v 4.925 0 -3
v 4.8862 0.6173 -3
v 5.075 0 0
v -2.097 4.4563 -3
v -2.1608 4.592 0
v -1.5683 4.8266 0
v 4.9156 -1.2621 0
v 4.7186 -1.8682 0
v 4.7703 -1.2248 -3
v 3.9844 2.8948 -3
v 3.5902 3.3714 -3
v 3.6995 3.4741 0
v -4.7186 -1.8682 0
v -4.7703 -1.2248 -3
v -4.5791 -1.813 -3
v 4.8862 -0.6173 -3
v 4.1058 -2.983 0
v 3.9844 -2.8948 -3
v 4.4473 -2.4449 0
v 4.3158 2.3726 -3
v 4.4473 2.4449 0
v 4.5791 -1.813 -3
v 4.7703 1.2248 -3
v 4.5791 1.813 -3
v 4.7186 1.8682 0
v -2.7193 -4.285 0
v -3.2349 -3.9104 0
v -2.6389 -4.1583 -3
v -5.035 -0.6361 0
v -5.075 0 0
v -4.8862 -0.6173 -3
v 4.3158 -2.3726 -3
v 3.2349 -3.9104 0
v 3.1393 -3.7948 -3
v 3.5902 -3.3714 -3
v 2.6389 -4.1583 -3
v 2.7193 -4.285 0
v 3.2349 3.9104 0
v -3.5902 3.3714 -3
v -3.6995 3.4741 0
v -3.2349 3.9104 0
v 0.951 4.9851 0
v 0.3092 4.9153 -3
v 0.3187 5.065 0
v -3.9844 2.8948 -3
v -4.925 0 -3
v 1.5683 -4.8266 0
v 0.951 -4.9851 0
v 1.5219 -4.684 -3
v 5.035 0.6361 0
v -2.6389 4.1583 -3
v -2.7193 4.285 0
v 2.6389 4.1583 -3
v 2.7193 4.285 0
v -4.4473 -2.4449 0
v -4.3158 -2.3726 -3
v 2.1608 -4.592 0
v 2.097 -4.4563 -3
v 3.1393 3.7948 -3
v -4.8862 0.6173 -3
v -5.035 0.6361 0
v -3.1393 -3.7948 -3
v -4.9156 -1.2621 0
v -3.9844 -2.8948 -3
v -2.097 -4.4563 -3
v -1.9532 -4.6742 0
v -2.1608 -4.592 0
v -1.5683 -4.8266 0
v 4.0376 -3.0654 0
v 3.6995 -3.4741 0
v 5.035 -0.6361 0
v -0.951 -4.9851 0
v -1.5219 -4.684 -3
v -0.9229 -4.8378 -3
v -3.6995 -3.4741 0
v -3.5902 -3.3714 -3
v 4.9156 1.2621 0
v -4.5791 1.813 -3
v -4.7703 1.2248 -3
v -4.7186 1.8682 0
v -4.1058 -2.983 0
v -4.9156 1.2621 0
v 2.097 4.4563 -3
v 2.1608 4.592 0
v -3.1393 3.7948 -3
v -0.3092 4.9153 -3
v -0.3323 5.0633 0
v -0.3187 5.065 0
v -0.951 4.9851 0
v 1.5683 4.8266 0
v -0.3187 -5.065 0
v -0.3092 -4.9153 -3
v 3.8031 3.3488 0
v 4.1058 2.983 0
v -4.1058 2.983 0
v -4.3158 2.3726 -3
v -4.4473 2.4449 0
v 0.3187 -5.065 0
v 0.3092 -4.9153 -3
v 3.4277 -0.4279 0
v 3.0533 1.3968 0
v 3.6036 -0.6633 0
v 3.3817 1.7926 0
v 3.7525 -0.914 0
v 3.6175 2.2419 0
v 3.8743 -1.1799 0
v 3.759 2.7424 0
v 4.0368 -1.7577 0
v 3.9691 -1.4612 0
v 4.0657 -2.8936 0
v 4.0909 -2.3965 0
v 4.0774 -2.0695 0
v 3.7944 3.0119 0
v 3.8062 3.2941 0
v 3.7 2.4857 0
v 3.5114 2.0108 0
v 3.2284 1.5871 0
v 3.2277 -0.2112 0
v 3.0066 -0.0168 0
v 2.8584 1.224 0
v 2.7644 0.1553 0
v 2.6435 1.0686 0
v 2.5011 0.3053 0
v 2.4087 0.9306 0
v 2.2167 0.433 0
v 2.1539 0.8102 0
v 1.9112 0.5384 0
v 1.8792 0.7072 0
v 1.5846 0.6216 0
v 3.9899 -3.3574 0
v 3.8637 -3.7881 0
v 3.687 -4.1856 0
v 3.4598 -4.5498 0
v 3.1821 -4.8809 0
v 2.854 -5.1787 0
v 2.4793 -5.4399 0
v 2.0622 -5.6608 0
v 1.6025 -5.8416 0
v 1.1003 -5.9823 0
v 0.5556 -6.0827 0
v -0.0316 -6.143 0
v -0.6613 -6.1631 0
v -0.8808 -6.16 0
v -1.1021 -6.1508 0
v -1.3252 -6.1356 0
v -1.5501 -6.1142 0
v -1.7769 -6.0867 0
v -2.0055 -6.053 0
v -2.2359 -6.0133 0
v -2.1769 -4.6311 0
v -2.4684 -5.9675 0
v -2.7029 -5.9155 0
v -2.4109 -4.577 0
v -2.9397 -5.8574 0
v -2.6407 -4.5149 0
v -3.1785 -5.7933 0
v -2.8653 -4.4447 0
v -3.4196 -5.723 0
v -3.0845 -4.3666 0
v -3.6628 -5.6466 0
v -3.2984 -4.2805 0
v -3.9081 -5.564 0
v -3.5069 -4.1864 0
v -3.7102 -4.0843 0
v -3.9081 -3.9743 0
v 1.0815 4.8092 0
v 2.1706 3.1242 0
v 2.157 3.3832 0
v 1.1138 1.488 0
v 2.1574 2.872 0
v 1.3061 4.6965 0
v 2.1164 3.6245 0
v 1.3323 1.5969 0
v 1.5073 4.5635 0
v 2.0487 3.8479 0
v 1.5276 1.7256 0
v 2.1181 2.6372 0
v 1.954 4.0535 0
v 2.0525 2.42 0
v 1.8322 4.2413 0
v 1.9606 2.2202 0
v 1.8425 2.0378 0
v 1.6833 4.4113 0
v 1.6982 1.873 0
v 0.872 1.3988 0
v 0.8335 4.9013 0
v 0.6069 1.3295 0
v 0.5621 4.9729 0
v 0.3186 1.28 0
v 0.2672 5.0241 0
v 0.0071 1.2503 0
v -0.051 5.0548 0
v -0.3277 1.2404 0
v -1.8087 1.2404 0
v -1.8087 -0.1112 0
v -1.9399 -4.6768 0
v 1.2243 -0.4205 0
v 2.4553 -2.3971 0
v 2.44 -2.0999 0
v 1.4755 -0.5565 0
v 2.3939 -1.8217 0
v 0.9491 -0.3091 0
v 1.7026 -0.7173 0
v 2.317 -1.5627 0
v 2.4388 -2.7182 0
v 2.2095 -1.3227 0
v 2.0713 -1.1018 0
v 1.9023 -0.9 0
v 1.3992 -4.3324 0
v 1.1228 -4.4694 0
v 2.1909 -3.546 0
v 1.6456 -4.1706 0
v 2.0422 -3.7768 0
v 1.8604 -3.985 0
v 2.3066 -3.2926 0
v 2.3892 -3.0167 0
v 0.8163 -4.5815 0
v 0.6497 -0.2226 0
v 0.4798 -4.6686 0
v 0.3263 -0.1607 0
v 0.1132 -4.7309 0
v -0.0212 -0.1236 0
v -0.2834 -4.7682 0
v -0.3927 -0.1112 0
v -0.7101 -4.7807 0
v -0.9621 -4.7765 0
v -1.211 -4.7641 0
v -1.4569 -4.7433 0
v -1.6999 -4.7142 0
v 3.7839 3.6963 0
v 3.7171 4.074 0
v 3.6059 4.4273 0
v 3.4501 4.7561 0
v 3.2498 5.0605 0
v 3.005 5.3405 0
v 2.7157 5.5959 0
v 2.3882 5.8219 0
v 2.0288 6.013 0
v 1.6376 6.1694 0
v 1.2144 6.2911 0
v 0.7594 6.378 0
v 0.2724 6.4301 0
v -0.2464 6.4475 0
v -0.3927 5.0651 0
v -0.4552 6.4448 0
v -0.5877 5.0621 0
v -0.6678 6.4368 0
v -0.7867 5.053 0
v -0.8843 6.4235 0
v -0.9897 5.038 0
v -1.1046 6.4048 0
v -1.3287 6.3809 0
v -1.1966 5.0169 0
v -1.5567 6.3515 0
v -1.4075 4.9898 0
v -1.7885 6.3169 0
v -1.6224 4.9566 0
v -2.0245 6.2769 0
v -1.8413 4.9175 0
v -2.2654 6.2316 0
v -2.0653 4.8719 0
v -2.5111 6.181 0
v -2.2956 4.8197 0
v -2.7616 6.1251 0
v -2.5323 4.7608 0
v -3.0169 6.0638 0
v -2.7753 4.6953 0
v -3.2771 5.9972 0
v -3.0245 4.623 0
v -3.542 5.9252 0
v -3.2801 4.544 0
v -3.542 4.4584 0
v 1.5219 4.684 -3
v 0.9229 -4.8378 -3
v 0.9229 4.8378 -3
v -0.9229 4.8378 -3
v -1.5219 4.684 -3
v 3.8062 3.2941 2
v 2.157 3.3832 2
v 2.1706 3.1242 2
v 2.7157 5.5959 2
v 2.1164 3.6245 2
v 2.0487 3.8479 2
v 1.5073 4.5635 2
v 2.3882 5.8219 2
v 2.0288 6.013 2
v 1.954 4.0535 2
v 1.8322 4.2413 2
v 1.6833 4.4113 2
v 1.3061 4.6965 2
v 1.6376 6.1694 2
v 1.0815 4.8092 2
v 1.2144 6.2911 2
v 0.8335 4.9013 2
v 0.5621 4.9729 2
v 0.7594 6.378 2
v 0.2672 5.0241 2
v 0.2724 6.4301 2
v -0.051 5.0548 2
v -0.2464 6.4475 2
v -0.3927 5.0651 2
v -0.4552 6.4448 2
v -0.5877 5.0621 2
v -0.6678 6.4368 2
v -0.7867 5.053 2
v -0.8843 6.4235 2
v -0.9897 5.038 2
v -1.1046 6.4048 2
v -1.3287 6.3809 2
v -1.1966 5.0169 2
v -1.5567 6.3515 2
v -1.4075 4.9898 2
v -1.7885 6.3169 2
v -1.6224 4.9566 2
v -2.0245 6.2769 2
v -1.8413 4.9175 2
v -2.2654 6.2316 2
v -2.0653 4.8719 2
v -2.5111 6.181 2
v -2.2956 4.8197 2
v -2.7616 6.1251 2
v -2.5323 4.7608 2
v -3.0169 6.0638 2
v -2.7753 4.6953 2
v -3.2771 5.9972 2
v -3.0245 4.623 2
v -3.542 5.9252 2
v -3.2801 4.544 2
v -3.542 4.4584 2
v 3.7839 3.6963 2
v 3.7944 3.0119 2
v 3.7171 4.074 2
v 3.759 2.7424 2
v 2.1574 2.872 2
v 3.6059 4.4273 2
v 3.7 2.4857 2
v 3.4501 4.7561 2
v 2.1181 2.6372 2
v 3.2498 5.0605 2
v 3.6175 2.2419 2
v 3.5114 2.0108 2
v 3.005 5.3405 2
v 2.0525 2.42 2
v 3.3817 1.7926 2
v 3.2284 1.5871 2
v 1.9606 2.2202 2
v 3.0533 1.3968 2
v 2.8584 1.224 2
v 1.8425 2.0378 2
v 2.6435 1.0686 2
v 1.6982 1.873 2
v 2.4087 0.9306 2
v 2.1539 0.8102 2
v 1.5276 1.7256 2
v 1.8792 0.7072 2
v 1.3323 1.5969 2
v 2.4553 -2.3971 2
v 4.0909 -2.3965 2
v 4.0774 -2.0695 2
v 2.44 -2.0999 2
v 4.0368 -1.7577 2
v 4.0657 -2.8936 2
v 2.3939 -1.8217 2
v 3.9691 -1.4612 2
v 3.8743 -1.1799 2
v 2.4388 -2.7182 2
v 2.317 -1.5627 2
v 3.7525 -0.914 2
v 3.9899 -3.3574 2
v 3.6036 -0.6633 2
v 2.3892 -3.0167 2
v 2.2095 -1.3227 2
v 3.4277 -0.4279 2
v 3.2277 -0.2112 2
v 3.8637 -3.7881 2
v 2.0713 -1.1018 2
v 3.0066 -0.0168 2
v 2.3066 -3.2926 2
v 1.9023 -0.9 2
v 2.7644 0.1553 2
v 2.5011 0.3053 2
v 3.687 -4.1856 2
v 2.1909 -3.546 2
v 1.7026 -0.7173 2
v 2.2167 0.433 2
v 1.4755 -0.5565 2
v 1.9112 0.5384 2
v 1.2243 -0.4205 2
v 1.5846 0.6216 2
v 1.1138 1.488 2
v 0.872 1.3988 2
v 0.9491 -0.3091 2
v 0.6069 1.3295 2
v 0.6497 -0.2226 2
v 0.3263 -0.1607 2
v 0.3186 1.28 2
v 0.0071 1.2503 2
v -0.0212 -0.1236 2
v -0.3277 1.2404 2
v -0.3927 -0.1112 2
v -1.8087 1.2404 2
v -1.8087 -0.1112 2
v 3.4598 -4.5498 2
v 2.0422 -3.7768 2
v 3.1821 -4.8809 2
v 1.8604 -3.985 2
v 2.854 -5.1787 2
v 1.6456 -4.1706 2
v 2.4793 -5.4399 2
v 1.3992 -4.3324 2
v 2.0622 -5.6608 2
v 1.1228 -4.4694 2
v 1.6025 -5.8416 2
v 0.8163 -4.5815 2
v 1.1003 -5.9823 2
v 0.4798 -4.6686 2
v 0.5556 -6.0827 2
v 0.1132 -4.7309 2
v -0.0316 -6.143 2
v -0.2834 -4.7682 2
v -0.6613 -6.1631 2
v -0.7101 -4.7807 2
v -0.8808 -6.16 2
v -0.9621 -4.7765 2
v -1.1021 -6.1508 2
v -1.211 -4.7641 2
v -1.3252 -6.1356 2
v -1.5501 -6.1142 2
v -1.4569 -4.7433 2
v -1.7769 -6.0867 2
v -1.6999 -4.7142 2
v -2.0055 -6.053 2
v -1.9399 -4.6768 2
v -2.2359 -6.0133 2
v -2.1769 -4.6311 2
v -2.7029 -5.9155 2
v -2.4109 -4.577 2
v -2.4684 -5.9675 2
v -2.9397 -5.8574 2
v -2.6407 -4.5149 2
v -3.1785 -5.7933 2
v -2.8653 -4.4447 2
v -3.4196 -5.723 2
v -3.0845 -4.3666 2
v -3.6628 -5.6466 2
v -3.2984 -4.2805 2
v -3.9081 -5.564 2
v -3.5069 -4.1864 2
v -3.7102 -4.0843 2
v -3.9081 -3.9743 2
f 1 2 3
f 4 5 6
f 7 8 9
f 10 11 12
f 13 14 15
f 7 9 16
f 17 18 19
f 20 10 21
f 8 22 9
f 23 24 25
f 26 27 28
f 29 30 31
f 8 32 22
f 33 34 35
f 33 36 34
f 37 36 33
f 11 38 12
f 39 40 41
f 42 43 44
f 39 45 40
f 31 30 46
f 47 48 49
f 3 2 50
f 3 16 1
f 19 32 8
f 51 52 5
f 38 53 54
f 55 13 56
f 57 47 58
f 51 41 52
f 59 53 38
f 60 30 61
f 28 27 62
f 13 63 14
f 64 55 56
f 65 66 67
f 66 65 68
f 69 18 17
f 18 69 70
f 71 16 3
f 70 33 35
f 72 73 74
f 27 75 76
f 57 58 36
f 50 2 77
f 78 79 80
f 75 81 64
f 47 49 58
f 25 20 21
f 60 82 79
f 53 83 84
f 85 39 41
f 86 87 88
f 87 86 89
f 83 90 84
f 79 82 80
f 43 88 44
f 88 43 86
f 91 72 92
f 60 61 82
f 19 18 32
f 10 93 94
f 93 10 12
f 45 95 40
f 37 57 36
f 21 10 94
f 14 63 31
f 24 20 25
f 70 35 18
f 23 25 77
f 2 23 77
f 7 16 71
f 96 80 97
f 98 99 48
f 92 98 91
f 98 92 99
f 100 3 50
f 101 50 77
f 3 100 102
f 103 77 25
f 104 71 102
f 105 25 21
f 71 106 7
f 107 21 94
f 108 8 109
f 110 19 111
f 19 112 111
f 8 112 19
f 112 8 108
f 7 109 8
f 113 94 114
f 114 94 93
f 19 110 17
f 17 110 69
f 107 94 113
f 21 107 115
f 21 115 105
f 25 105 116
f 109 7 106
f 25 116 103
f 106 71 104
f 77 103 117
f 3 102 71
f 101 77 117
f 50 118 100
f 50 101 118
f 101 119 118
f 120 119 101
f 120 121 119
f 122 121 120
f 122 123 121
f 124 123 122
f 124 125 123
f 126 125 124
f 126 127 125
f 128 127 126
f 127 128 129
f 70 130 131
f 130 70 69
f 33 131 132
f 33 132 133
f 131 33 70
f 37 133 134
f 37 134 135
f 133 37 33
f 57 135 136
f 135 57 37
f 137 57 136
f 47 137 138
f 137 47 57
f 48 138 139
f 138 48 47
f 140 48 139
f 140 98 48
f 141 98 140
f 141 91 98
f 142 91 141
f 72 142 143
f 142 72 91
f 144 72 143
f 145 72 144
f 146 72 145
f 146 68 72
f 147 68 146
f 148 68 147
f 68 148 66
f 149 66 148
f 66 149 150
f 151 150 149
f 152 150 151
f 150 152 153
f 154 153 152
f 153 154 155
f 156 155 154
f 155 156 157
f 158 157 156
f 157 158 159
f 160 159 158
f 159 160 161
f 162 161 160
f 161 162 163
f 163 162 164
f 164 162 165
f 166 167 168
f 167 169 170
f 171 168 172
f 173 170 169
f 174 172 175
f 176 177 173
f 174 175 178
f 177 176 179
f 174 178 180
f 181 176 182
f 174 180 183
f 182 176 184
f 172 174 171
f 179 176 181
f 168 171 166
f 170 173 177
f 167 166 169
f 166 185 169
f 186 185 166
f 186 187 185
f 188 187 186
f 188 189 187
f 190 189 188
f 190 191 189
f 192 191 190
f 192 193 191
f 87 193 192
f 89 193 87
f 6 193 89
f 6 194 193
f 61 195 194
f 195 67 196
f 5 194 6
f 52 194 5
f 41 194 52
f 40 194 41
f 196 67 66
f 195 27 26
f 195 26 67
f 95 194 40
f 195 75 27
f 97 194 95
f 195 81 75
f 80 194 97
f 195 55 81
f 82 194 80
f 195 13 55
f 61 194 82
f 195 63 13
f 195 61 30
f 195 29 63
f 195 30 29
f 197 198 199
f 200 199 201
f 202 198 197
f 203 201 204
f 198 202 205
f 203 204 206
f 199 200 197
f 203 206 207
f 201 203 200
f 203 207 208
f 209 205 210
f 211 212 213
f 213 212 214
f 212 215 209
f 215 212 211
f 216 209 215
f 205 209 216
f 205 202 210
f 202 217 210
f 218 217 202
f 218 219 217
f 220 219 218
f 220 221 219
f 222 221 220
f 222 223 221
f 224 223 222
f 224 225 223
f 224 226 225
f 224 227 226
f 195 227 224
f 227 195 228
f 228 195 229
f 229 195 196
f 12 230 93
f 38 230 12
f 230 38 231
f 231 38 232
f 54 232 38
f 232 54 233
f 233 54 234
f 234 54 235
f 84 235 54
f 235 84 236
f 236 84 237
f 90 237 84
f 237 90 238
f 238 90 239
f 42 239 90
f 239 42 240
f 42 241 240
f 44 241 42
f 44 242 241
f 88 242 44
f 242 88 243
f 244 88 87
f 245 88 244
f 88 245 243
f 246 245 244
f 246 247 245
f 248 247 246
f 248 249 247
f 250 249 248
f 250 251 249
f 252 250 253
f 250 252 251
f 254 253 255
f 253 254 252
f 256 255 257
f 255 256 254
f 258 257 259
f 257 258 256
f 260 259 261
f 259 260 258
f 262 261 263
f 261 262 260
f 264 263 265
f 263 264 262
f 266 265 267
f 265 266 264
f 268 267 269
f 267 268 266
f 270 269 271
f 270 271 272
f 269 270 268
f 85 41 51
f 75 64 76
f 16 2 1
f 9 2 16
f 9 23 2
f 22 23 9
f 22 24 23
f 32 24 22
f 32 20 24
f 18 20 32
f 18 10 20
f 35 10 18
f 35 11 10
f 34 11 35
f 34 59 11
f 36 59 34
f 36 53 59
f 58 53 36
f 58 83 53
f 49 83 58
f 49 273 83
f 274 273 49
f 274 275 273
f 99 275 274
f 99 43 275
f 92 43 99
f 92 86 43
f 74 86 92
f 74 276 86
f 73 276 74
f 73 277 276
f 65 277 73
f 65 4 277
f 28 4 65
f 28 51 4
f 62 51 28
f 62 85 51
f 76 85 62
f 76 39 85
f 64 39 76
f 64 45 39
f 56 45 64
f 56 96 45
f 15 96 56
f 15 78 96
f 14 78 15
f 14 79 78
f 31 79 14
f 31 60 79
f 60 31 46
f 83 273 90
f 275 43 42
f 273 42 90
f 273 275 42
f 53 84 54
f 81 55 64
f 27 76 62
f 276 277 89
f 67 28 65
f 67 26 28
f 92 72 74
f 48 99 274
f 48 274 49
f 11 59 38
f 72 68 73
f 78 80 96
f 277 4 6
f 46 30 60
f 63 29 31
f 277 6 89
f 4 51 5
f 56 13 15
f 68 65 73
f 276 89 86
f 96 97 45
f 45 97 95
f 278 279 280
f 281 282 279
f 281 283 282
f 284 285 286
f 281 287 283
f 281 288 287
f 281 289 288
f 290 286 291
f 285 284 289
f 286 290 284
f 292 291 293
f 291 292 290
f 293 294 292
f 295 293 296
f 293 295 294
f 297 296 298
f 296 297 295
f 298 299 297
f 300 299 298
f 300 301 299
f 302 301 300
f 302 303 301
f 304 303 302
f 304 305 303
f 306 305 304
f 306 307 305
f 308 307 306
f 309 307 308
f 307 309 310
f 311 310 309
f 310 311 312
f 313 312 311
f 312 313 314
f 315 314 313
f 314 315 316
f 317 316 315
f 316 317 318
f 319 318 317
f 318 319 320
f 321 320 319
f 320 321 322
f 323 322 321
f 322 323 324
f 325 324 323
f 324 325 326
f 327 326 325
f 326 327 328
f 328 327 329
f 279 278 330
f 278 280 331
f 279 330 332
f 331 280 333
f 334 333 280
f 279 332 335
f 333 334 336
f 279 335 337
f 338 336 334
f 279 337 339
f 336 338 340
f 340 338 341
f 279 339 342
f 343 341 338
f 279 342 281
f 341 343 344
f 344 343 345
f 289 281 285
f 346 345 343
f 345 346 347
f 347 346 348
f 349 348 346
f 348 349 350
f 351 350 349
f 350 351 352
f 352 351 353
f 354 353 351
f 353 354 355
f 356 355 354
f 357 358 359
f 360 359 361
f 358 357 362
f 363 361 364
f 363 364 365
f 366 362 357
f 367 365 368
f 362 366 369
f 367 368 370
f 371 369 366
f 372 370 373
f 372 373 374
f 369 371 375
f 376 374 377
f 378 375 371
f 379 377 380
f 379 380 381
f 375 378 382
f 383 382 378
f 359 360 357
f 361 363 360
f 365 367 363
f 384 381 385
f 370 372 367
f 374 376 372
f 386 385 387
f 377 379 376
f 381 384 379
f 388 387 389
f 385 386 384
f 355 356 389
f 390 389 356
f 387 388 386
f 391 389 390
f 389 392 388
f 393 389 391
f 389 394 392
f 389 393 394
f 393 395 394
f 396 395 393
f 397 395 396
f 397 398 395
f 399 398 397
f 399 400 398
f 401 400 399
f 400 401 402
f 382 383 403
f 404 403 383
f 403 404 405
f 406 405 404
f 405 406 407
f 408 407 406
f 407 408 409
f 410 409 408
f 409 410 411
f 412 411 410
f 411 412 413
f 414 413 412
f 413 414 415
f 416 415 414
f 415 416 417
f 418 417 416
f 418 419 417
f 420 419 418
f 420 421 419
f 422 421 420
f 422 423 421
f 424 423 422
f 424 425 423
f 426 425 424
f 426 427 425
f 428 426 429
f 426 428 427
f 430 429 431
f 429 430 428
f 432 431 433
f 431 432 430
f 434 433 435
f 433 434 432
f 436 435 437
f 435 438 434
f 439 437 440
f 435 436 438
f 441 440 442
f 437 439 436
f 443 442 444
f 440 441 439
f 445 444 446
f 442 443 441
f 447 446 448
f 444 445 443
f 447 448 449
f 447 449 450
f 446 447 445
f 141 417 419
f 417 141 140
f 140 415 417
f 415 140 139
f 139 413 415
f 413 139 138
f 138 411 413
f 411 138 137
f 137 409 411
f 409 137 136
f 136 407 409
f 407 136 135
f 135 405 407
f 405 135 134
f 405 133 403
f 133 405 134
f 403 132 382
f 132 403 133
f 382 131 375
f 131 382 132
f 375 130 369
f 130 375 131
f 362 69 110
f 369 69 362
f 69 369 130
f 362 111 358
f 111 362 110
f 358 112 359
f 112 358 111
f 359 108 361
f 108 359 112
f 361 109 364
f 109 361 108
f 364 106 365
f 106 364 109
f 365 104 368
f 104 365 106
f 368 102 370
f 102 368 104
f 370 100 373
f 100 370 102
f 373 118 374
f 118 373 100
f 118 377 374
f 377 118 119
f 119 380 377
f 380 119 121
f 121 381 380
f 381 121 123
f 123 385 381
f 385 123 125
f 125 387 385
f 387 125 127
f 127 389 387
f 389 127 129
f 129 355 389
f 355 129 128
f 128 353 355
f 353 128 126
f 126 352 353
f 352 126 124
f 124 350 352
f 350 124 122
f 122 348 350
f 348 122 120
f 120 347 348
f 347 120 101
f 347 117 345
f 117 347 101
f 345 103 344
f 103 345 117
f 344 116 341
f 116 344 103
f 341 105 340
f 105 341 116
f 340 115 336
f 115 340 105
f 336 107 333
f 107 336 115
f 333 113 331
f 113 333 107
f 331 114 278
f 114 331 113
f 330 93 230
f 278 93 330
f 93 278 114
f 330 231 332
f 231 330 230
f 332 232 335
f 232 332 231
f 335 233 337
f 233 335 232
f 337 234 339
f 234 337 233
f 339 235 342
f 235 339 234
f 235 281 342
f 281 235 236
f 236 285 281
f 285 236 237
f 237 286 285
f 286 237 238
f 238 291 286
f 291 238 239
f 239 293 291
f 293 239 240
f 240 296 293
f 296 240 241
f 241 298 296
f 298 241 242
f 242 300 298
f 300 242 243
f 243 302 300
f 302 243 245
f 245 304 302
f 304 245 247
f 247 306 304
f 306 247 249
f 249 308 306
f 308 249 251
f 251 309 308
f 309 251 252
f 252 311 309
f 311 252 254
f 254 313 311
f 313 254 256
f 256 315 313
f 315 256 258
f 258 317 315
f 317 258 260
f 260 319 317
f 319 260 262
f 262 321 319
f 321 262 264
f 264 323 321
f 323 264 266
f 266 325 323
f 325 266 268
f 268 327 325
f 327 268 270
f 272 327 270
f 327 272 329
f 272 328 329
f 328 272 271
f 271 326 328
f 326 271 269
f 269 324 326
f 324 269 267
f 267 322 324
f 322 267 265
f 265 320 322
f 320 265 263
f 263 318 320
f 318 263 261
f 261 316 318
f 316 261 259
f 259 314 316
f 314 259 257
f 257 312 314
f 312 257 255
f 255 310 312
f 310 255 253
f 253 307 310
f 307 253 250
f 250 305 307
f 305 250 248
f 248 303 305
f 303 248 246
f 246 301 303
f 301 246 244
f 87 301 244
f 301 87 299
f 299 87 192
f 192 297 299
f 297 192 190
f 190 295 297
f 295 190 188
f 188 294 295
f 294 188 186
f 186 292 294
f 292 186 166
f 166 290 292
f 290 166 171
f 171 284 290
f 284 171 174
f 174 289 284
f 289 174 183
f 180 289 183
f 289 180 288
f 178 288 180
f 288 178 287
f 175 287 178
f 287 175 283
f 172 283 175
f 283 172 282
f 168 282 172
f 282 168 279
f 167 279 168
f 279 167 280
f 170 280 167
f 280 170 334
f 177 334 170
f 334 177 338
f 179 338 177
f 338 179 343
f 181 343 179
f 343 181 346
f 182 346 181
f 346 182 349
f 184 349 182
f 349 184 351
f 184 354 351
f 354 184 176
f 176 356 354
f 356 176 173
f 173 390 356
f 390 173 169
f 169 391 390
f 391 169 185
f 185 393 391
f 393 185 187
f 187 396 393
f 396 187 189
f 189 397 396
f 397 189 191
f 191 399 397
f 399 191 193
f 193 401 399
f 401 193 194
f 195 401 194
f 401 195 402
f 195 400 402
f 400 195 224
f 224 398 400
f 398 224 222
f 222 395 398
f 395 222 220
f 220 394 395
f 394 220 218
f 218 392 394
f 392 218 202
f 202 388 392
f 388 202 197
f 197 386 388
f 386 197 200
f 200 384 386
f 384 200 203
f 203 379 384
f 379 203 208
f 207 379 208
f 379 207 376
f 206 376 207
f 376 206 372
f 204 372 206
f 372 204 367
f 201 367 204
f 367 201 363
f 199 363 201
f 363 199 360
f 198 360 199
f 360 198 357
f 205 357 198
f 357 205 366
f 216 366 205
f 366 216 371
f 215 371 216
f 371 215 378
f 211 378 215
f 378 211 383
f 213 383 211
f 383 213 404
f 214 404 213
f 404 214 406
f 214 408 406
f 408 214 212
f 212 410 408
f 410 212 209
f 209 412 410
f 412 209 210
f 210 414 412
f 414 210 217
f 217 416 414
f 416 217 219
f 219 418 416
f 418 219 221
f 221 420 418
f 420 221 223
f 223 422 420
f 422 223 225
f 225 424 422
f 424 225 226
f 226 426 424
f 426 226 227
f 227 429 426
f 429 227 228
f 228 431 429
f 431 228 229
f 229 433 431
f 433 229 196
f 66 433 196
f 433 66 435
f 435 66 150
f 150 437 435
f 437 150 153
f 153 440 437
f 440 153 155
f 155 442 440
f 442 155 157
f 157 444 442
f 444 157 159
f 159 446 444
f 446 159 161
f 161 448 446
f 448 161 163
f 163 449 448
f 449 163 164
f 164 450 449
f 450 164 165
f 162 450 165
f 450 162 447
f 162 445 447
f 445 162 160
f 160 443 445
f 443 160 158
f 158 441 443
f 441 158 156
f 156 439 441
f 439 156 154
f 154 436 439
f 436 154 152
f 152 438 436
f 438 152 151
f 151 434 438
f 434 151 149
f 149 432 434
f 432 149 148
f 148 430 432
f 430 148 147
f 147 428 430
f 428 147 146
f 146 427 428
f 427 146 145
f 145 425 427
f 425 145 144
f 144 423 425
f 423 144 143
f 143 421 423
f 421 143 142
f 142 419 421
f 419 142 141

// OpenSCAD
$fn = 50;


difference() {
	union() {
		translate(v = [0, 0, -3.0000000000]) {
			cylinder(h = 3, r1 = 4.9250000000, r2 = 5.0750000000);
		}
		linear_extrude(height = 2) {
			text(font = "Impact", halign = "center", size = 12, text = "3", valign = "center");
		}
	}
	union();
}
